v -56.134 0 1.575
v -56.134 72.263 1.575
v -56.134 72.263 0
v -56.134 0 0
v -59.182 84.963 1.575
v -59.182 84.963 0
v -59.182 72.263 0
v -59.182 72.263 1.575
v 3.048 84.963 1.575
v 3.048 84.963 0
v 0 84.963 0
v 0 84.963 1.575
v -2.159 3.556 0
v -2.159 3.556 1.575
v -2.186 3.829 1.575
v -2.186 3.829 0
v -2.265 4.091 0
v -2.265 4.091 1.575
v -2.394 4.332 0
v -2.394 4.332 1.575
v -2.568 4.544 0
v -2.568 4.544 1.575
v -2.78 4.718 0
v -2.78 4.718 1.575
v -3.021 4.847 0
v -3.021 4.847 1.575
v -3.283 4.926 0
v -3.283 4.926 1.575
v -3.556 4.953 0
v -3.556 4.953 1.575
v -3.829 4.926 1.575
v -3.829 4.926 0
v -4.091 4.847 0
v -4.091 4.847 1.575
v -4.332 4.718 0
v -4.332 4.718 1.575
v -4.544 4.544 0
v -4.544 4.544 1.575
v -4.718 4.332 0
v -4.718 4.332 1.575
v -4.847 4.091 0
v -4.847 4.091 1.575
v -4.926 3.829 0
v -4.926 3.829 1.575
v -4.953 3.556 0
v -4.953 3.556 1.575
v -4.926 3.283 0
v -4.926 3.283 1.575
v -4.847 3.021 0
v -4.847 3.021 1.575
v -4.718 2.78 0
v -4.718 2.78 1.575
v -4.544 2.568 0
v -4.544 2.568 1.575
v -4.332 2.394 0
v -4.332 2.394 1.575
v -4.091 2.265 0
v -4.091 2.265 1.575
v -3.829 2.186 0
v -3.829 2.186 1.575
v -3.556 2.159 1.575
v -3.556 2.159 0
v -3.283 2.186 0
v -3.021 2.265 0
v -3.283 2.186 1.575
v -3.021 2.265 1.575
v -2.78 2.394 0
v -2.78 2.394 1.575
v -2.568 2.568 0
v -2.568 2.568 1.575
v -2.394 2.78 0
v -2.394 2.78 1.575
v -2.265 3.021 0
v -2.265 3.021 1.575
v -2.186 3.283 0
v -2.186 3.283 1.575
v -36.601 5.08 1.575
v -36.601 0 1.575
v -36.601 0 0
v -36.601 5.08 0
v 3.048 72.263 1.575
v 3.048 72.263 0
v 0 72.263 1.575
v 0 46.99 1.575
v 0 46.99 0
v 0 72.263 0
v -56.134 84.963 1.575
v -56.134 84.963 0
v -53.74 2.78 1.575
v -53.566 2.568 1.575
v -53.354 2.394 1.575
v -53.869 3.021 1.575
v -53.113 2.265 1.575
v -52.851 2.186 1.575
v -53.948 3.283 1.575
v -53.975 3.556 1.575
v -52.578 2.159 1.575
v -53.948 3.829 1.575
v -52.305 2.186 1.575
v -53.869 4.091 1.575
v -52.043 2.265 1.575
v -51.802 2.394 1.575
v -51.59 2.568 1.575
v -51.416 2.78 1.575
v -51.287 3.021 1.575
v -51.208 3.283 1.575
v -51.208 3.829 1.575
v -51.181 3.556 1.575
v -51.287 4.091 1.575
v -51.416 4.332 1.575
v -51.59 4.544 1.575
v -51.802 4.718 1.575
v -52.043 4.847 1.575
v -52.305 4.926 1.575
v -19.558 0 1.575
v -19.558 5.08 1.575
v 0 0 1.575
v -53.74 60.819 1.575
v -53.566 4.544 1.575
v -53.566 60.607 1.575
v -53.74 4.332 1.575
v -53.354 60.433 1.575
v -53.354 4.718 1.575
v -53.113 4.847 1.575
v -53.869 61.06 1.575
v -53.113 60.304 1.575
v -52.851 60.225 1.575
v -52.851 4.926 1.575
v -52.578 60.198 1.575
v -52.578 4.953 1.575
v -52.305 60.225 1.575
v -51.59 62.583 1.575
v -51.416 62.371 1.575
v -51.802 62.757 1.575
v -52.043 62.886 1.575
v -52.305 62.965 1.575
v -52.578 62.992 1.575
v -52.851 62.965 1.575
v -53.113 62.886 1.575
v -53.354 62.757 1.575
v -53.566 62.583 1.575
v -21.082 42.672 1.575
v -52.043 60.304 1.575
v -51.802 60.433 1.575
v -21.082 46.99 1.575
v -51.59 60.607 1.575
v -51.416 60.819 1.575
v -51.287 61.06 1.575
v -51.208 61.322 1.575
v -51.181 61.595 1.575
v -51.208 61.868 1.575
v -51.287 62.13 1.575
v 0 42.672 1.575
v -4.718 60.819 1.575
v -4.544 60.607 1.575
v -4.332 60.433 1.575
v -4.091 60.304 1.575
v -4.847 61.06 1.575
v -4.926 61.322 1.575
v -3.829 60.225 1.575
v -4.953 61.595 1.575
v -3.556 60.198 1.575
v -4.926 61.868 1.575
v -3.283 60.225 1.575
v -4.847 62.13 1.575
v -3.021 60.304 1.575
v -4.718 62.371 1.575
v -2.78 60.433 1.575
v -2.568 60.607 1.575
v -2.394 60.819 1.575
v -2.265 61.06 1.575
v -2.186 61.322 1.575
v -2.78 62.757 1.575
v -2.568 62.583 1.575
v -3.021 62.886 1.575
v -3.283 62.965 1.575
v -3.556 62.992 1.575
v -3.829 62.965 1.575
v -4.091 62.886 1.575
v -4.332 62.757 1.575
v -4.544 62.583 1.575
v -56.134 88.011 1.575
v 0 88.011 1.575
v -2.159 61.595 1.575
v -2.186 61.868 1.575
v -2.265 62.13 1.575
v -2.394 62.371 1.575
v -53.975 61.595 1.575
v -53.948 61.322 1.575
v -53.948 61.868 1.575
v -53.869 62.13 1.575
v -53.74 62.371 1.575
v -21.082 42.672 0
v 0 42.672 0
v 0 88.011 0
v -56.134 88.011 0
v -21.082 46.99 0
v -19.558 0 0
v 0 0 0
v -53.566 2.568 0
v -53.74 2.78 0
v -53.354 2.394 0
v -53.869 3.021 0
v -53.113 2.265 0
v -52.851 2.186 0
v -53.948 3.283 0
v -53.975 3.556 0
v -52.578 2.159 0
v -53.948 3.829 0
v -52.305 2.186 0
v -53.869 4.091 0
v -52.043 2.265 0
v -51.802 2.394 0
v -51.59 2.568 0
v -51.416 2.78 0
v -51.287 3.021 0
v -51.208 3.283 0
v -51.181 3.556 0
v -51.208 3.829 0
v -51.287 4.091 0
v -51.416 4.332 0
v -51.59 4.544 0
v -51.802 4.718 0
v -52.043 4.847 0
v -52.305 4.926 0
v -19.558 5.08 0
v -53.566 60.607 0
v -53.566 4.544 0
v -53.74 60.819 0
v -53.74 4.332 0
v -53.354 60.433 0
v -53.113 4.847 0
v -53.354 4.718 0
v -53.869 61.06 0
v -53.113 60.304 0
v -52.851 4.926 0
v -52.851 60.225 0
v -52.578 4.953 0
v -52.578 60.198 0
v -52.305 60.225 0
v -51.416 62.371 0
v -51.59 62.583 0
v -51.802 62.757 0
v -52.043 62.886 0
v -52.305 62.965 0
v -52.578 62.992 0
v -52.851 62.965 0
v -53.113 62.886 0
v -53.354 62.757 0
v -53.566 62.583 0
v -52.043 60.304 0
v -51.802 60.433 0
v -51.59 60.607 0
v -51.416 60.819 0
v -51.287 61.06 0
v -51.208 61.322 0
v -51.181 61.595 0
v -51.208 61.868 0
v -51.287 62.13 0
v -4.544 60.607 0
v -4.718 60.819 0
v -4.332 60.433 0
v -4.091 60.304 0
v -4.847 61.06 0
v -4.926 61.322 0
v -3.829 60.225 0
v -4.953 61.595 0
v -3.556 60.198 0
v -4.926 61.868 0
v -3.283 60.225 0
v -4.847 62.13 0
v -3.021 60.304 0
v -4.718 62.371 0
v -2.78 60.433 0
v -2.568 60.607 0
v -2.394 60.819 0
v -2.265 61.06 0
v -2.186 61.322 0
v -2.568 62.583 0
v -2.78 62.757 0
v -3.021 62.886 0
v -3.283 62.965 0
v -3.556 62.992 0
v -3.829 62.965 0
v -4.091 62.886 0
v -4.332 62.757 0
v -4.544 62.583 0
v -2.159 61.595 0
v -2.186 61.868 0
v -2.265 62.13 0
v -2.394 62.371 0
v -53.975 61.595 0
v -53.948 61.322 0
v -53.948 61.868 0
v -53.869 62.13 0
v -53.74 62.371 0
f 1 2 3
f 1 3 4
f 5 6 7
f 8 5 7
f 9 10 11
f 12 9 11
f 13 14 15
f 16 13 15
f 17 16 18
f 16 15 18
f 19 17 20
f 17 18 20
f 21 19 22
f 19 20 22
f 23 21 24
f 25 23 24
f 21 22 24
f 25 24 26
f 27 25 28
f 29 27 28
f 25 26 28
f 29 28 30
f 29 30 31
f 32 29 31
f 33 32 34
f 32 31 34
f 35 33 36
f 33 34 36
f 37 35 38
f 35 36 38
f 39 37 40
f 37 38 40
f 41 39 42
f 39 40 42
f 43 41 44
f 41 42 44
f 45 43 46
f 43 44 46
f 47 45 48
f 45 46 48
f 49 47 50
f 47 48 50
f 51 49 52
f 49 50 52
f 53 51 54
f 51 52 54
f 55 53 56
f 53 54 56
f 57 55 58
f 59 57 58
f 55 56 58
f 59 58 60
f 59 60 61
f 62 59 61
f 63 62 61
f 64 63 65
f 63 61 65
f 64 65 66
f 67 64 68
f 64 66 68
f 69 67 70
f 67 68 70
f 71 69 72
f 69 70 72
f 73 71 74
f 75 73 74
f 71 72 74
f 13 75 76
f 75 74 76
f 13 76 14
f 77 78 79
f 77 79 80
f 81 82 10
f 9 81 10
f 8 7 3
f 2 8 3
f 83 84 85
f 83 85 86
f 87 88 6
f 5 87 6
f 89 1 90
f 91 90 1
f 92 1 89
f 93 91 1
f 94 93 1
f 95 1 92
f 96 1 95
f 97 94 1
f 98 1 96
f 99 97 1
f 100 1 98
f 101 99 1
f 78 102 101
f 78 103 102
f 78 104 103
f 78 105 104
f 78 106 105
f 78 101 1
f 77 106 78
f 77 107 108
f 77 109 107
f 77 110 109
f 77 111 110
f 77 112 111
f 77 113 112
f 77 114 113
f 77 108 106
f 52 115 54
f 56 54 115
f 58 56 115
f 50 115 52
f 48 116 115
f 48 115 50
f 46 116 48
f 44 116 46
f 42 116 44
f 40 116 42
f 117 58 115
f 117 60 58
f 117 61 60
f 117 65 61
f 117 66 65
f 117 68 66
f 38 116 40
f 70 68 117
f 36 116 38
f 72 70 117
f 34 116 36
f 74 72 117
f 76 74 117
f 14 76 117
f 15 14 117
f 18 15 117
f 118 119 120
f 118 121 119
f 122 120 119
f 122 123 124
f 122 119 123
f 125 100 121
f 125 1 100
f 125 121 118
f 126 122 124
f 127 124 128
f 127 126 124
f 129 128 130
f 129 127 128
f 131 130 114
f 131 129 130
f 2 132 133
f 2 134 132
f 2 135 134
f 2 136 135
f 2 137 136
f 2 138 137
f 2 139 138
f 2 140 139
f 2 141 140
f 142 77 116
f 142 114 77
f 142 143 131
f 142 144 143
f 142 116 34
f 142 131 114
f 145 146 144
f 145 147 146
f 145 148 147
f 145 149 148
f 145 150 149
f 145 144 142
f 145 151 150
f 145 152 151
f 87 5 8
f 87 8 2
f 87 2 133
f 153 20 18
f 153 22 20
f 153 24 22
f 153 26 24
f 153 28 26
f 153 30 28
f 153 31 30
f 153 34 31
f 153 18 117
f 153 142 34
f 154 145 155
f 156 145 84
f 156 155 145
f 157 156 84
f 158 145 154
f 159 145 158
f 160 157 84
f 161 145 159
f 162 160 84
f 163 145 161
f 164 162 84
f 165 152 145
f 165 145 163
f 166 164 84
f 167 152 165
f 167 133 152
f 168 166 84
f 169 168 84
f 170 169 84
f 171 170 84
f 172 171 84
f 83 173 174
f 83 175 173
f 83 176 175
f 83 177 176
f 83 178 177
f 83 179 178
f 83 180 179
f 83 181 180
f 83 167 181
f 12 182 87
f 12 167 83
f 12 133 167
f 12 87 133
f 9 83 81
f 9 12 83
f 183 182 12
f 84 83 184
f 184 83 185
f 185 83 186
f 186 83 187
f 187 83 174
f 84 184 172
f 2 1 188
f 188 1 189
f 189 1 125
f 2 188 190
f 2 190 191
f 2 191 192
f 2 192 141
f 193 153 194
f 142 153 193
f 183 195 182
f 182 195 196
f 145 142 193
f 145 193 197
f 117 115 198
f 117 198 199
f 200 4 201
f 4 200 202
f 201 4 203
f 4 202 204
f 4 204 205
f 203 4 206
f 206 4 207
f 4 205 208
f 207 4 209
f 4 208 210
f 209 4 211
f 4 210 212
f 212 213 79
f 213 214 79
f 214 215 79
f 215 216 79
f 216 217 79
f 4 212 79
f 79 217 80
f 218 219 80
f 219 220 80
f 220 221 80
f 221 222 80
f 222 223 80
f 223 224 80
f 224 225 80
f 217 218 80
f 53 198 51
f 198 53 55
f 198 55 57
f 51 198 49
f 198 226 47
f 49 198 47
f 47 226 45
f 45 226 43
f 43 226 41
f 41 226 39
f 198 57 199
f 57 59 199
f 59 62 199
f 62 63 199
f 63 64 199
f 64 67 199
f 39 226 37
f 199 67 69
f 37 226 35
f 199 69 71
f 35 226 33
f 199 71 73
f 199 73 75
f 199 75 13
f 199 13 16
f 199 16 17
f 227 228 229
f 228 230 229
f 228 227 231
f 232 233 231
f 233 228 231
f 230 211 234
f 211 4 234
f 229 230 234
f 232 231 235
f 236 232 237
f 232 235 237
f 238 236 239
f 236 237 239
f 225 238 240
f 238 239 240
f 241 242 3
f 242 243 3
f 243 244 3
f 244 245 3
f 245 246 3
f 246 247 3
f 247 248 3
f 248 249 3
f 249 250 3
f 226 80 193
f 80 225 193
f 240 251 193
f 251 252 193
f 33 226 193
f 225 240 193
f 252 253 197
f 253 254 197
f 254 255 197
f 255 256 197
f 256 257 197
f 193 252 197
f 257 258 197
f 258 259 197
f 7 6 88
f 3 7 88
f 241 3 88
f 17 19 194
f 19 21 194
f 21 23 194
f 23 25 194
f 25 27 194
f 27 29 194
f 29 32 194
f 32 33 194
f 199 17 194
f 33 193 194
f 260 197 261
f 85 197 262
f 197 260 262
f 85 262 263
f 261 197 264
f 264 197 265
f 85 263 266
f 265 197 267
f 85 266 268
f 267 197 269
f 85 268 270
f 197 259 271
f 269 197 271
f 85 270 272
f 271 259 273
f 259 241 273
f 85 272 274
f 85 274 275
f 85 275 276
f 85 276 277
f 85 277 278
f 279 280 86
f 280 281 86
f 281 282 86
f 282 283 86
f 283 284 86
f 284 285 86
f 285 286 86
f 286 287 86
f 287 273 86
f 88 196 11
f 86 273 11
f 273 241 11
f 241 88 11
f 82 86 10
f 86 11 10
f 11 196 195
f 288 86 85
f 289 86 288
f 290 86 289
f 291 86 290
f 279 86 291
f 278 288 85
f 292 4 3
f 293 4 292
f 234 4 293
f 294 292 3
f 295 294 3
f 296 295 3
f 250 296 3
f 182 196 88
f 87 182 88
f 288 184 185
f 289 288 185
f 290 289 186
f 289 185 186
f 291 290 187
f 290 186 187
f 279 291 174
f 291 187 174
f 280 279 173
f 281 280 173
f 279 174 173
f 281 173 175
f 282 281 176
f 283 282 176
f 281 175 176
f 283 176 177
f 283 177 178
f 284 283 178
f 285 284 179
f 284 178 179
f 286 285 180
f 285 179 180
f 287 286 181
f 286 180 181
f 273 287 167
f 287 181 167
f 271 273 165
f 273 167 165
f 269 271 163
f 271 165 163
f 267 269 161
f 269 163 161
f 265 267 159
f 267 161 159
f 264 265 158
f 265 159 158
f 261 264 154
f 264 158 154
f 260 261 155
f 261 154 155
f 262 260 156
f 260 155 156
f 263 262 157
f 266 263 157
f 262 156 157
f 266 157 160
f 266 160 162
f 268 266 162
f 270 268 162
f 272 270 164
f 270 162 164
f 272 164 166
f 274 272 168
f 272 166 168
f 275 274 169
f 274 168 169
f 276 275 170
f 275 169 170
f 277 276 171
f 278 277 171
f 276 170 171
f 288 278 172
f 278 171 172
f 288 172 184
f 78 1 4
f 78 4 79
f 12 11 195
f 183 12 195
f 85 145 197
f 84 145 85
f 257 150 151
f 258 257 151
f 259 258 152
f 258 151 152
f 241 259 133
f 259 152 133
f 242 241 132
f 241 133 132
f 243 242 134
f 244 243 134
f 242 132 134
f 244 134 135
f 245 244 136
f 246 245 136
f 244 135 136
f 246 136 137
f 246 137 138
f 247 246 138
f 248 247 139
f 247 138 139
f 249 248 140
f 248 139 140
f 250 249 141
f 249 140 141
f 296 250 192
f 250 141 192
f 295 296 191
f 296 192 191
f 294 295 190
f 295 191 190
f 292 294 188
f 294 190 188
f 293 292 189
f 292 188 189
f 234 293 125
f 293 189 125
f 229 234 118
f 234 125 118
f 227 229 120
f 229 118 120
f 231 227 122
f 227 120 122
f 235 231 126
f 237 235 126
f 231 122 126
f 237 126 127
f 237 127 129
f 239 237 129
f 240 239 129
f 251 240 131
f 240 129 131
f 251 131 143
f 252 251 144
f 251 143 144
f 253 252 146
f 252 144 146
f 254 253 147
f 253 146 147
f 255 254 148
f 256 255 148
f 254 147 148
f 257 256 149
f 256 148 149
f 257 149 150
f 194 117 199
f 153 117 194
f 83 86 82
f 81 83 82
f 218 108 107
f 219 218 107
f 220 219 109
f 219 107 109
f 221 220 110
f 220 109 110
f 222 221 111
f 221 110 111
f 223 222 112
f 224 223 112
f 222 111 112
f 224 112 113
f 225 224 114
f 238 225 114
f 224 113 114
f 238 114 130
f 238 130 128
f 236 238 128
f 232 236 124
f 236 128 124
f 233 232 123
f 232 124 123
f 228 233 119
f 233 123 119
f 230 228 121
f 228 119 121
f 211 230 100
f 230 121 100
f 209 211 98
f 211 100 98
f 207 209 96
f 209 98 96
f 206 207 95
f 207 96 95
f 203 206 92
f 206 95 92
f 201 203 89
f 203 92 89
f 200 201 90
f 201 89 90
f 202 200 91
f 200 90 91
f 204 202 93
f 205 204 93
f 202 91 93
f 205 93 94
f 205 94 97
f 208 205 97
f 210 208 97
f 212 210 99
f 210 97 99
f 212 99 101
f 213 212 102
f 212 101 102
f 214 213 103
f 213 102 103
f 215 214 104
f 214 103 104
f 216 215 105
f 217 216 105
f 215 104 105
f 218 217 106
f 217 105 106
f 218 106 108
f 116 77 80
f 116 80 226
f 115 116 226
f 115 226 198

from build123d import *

# Parameters (mm, degrees)
BOSS_EXTRUDE1_DEPTH = 1.5748
SKETCH2_R           = 1.397
BOSS_EXTRUDE2_DEPTH = 1.5748


with BuildPart() as part:
    # Sketch1 → Boss-Extrude1 (new body)
    with BuildSketch(Plane.XY):
        Polygon((3.048, 84.963), (0, 84.963), (0, 88.011), (-56.134, 88.011), (-56.134, 84.963), (-59.182, 84.963), (-59.182, 72.263), (-56.134, 72.263), (-56.134, 64.77), (0, 64.77), (0, 72.263), (3.048, 72.263), align=None)
    extrude(amount=BOSS_EXTRUDE1_DEPTH)

    # Sketch2 → Boss-Extrude2 (add)
    with BuildSketch(Plane.XY.offset(1.5748)):
        Polygon((-36.6014, 0), (-36.6014, 5.08), (-19.558, 5.08), (-19.558, 0), (0, 0), (0, 42.672), (-21.082, 42.672), (-21.082, 46.99), (0, 46.99), (0, 64.77), (-56.134, 64.77), (-56.134, 0), align=None)
        with Locations((-52.578, 3.556)):
            Circle(SKETCH2_R, mode=Mode.SUBTRACT)
        with Locations((-3.556, 3.556)):
            Circle(SKETCH2_R, mode=Mode.SUBTRACT)
        with Locations((-52.578, 61.595)):
            Circle(SKETCH2_R, mode=Mode.SUBTRACT)
        with Locations((-3.556, 61.595)):
            Circle(SKETCH2_R, mode=Mode.SUBTRACT)
    extrude(amount=-BOSS_EXTRUDE2_DEPTH)


solid = part.part
